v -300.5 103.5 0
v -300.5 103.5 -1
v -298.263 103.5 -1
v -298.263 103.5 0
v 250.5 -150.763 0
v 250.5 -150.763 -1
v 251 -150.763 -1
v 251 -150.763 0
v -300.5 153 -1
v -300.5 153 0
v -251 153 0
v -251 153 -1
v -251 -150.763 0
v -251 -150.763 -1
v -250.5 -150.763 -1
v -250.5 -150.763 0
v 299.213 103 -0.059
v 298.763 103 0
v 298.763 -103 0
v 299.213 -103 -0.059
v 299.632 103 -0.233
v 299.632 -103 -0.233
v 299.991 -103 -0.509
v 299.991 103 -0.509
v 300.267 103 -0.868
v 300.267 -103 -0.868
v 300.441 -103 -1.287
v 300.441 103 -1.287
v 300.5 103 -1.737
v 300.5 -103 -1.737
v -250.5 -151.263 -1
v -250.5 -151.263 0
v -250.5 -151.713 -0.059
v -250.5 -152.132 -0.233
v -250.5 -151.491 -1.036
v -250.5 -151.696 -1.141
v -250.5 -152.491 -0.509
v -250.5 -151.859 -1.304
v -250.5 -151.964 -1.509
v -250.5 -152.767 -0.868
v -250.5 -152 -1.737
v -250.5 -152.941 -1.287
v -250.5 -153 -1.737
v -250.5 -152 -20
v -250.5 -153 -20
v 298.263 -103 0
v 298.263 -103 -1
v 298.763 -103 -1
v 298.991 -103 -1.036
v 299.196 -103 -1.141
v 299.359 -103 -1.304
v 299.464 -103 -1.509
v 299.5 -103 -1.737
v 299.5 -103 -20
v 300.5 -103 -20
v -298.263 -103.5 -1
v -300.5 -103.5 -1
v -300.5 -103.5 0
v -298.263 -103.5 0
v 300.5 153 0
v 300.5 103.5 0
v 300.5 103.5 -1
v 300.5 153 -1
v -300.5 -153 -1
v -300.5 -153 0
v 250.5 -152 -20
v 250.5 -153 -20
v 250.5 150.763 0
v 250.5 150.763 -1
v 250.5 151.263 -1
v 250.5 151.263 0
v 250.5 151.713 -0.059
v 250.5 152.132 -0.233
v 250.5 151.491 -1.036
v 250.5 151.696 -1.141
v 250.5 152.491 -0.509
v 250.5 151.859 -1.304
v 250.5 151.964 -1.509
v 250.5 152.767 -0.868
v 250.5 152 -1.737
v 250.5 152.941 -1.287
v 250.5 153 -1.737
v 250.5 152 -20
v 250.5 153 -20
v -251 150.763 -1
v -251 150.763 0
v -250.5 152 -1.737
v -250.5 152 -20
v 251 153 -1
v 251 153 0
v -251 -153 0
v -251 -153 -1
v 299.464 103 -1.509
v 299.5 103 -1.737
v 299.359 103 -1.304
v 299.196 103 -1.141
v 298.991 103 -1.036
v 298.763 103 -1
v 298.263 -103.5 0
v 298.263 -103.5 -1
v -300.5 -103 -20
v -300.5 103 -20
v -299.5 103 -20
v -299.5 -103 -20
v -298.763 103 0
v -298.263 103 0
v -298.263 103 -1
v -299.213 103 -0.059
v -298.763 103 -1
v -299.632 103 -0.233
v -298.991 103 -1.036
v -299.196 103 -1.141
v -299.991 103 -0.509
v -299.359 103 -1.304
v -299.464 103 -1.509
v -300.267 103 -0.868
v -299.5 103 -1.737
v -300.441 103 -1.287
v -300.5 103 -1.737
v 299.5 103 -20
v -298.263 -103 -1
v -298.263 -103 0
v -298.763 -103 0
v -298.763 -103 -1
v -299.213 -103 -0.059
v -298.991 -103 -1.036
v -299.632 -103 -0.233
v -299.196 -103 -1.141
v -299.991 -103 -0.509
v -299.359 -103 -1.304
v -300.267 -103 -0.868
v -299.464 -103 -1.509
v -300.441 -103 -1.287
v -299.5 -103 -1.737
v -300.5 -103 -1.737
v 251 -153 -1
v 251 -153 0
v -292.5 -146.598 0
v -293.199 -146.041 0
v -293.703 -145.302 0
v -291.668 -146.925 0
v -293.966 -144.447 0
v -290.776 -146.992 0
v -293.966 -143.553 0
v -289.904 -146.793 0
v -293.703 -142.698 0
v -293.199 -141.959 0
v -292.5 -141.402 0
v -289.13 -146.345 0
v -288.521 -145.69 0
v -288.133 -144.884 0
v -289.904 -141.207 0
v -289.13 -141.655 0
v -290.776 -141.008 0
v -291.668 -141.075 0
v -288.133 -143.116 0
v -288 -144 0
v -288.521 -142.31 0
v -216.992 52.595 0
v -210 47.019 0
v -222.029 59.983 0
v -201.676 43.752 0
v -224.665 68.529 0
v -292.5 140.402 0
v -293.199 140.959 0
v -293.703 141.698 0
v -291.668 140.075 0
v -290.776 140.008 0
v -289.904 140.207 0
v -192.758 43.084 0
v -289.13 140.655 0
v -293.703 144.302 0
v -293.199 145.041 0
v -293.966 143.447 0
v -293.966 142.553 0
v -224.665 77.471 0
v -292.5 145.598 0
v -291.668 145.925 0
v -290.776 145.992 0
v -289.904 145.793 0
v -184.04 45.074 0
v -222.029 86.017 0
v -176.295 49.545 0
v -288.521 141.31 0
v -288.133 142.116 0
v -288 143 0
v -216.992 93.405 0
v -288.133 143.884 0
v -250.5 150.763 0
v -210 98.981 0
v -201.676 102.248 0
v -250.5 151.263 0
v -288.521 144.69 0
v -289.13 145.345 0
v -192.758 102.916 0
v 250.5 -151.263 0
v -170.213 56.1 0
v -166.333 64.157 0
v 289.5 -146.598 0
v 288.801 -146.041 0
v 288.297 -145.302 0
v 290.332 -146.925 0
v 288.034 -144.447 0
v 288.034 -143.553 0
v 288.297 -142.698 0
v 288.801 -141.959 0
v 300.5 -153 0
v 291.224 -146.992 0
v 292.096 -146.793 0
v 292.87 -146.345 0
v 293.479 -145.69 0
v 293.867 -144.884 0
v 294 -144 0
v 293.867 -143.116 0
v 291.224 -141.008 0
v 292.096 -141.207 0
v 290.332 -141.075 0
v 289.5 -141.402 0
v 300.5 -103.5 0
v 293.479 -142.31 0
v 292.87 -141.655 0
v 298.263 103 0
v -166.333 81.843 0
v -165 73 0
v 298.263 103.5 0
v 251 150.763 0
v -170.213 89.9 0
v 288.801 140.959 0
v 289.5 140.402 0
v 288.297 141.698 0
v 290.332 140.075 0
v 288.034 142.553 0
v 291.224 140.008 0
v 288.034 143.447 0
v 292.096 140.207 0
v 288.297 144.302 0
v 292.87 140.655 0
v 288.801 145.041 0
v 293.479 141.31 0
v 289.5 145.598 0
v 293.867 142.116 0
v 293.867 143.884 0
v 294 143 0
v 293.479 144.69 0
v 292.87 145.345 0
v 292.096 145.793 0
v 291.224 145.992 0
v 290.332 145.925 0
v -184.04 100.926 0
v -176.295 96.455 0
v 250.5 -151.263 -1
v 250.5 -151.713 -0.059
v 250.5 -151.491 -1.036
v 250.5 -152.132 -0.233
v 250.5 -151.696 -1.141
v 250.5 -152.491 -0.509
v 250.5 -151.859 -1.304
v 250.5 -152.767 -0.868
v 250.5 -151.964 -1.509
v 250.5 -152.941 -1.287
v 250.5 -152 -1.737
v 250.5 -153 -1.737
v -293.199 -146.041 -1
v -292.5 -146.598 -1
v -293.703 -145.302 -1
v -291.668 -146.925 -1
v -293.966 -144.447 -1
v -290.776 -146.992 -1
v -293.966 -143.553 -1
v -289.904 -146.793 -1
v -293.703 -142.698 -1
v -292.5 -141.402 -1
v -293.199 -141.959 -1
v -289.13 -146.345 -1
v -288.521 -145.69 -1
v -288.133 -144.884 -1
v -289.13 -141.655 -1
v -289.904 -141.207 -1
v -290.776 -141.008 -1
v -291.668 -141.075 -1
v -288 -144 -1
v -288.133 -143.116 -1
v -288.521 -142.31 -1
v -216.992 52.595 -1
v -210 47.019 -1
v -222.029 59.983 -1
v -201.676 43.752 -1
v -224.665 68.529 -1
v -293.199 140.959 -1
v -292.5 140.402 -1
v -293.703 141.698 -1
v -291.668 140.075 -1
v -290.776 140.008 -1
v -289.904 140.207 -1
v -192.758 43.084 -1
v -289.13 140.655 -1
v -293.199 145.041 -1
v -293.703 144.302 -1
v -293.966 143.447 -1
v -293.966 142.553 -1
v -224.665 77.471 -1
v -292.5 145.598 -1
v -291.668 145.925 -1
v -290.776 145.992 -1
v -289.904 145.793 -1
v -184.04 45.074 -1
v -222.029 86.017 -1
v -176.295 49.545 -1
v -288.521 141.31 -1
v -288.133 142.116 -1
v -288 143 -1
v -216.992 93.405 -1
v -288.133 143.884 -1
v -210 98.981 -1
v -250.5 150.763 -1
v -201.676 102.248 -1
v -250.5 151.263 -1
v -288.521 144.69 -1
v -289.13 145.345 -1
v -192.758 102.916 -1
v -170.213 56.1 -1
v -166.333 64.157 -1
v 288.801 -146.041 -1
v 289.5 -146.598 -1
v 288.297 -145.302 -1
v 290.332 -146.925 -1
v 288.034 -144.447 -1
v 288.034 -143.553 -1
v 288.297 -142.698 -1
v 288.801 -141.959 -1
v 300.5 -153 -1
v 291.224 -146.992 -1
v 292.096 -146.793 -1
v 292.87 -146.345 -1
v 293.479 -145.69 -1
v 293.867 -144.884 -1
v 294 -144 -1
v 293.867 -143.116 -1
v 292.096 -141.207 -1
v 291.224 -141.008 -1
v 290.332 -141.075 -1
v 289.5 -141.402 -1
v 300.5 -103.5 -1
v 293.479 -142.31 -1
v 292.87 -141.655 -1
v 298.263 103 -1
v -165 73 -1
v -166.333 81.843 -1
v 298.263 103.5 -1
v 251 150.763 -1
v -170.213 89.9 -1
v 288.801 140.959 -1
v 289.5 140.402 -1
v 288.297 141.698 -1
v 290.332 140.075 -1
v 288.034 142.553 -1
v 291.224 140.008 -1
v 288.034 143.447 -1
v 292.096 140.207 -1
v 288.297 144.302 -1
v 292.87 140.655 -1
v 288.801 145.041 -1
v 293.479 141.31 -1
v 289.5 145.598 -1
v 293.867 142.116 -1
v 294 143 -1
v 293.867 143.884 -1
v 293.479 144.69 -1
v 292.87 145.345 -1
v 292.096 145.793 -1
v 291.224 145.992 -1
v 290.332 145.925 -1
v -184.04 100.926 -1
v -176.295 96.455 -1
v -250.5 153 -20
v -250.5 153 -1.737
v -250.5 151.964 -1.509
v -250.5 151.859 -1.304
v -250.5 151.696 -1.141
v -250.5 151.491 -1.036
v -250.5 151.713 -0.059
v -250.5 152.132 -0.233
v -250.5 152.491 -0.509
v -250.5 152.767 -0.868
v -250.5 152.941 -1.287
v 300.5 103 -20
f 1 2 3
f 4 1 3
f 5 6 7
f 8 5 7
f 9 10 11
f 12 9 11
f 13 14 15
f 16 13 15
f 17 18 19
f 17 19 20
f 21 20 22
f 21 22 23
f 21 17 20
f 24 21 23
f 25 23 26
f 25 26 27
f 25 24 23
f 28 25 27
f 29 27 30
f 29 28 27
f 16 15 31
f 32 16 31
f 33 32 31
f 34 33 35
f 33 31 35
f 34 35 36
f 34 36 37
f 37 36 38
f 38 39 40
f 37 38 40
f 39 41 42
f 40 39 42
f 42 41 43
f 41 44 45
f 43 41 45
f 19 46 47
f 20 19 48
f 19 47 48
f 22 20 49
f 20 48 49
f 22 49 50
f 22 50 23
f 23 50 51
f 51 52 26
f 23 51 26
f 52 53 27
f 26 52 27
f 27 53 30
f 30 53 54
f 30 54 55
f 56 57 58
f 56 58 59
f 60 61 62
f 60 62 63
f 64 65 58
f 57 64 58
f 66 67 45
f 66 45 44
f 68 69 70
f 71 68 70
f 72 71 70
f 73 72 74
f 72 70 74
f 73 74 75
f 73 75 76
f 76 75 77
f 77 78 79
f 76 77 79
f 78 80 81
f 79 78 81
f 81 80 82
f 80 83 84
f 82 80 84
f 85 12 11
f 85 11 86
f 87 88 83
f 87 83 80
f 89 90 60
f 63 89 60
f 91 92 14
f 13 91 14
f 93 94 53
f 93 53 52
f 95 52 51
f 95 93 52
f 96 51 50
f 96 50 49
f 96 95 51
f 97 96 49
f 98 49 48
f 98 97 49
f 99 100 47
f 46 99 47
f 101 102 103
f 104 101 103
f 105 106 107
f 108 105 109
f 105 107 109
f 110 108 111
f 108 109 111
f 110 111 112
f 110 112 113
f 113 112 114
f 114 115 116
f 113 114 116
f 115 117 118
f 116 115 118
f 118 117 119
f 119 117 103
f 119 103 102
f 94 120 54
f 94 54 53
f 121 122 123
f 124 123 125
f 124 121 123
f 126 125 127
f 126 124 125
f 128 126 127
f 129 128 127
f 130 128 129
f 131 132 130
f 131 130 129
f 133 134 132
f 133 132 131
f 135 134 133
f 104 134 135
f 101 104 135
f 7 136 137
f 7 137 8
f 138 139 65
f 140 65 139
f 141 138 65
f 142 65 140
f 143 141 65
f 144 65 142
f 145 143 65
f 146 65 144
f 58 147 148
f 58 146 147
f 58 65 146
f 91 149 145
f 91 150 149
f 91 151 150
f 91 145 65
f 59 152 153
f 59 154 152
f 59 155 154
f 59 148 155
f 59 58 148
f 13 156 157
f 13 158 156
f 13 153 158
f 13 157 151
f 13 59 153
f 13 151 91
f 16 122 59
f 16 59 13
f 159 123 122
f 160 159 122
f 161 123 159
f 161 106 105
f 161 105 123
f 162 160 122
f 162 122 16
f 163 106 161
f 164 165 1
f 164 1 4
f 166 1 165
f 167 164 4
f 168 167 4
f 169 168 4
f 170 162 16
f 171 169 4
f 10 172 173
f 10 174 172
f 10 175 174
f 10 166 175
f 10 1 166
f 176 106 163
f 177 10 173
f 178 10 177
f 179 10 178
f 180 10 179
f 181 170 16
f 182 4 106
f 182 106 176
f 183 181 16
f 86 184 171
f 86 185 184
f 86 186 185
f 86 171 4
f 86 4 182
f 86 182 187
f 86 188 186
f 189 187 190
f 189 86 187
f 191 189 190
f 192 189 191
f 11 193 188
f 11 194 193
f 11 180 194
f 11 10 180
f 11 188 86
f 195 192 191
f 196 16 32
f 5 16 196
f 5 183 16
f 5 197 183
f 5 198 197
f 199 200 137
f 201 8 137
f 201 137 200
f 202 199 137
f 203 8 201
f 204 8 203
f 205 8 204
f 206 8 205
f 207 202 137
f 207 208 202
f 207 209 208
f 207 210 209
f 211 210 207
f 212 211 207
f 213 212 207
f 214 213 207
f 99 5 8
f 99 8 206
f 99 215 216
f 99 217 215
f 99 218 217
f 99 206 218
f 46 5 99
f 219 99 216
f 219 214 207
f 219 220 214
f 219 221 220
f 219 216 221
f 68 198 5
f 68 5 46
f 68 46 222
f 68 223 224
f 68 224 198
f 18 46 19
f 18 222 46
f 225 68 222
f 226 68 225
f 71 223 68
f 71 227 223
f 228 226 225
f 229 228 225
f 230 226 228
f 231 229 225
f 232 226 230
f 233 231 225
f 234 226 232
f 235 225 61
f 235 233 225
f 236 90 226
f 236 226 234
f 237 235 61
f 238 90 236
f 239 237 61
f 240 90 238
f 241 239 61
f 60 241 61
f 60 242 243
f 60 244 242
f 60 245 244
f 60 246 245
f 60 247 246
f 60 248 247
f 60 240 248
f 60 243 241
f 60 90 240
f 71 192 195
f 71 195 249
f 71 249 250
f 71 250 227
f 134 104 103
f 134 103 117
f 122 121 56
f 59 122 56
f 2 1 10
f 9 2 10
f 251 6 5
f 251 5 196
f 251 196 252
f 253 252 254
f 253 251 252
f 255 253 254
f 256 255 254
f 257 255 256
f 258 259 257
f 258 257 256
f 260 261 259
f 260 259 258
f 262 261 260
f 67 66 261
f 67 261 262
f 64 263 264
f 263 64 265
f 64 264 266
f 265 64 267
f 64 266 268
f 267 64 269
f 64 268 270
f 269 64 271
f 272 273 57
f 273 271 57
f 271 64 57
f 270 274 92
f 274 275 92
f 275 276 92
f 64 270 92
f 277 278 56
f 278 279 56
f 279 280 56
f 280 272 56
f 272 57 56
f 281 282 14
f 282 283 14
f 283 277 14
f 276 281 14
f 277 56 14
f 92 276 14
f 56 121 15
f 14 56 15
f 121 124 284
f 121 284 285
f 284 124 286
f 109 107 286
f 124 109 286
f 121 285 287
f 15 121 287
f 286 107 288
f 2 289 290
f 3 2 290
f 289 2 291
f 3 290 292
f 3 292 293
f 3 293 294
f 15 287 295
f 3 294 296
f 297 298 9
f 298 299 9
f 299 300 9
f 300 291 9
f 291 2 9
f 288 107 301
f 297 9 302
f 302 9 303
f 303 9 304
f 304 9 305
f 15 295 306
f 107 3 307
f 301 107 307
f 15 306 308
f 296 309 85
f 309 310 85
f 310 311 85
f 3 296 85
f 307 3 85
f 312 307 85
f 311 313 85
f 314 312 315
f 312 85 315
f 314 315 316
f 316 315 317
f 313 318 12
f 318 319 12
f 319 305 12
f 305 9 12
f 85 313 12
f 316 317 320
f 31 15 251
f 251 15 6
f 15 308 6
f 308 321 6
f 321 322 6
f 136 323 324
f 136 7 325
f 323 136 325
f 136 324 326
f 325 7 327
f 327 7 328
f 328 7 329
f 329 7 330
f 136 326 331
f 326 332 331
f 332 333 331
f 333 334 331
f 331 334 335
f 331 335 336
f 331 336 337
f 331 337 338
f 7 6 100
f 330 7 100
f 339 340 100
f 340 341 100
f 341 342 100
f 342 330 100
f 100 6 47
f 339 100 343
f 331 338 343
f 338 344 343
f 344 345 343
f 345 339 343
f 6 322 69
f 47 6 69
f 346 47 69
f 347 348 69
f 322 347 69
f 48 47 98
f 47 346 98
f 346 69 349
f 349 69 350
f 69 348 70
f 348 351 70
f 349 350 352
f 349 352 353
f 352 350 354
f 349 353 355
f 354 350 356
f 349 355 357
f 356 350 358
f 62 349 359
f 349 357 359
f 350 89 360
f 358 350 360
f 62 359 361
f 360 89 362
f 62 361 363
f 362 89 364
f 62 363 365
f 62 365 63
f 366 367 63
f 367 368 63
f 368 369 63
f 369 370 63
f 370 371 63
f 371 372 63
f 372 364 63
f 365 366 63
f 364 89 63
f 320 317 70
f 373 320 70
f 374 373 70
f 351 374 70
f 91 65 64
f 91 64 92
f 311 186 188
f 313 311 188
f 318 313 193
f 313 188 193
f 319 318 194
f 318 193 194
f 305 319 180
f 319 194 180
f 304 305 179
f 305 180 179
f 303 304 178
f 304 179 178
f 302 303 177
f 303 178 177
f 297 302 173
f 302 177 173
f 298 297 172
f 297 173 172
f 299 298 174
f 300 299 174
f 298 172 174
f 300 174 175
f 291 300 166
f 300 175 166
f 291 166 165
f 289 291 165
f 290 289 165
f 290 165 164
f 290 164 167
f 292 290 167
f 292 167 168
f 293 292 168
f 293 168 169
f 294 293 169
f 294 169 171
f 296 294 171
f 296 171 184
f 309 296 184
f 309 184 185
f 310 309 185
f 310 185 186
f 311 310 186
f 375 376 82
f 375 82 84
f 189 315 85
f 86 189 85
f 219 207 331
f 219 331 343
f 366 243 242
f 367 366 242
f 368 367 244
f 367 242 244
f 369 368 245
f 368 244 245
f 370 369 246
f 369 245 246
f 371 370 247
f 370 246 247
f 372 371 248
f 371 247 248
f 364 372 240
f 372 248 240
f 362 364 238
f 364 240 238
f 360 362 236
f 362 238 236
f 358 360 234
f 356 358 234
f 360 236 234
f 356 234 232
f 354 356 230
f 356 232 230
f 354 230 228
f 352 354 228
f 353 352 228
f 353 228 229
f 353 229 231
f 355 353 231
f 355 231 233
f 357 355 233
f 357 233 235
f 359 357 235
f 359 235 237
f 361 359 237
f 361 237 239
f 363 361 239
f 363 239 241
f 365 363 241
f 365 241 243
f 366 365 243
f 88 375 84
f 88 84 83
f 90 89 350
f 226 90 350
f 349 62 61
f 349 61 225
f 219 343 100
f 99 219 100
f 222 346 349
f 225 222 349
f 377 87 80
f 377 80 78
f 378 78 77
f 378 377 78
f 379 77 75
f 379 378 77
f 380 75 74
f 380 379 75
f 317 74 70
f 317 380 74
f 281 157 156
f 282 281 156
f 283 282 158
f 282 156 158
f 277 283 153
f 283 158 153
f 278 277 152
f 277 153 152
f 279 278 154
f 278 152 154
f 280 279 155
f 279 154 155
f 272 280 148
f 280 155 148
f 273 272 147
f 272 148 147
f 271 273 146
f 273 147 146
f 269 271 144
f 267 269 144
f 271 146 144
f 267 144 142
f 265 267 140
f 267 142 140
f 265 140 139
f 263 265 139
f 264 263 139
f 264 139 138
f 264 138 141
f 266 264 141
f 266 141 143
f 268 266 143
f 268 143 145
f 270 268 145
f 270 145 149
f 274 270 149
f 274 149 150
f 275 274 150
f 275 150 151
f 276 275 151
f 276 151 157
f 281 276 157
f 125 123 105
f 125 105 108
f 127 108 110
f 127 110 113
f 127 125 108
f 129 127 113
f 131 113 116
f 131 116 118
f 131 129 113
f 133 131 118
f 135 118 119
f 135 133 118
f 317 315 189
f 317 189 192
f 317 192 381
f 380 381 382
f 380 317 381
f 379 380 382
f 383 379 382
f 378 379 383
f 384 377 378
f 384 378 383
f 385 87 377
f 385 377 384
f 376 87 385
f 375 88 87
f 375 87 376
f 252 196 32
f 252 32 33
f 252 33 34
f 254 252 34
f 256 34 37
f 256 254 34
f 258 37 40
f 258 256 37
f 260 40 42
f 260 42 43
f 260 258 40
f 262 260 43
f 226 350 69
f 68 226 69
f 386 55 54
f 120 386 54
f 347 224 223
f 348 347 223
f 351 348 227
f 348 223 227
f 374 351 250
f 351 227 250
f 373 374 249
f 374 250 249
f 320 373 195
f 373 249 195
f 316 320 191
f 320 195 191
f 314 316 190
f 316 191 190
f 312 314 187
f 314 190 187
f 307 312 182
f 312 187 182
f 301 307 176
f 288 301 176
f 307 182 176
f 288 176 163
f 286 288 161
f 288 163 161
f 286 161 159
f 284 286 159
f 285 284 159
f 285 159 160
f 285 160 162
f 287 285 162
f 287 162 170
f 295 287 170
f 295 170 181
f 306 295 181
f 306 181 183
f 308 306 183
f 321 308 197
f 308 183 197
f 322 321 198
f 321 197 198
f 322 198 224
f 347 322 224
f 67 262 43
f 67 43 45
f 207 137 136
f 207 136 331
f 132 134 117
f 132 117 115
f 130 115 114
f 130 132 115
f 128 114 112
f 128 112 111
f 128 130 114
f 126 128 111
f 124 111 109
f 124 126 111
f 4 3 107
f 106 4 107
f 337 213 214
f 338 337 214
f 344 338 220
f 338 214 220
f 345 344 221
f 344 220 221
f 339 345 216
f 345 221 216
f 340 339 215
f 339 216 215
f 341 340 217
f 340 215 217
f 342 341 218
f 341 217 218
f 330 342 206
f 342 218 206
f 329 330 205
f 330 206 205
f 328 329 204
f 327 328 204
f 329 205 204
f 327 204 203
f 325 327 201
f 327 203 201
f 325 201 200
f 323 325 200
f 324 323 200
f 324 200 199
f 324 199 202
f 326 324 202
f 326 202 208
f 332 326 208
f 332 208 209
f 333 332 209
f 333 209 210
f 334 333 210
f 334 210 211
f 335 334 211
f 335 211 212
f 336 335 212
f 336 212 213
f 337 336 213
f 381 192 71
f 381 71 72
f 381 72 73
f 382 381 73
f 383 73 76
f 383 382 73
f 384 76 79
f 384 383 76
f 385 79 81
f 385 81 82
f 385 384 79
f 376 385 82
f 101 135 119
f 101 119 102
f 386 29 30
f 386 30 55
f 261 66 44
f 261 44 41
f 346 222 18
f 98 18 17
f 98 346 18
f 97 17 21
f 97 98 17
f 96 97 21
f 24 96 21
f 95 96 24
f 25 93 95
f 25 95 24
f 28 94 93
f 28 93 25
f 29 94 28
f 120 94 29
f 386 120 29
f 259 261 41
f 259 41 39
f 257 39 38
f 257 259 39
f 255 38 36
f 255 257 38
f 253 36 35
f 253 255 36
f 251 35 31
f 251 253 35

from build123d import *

# Parameters (mm, degrees)
SKETCH_1_W                        = 601
SKETCH_1_H                        = 306
SKETCH_1_R                        = 30
SM_BASE_FLANGE_1_DEPTH            = 1
SM_EDGE_FLANGE_1_STRIP_W          = 5.4732
SM_EDGE_FLANGE_1_STRIP_H          = 1
SM_EDGE_FLANGE_1_STRIP_CUT_DEPTH  = 501
SM_EDGE_FLANGE_1_RELIEF_W         = 5.9732
SM_EDGE_FLANGE_1_RELIEF_H         = 0.5
SM_EDGE_FLANGE_1_RELIEF_CUT_DEPTH = 1
SM_EDGE_FLANGE_1_DEPTH            = 501
SM_EDGE_FLANGE_2_STRIP_W          = 5.4732
SM_EDGE_FLANGE_2_STRIP_H          = 1
SM_EDGE_FLANGE_2_STRIP_CUT_DEPTH  = 206
SM_EDGE_FLANGE_2_RELIEF_W         = 5.9732
SM_EDGE_FLANGE_2_RELIEF_H         = 0.5
SM_EDGE_FLANGE_2_RELIEF_CUT_DEPTH = 1
SM_EDGE_FLANGE_2_DEPTH            = 206
SM_EDGE_FLANGE_3_STRIP_W          = 5.4732
SM_EDGE_FLANGE_3_STRIP_H          = 1
SM_EDGE_FLANGE_3_STRIP_CUT_DEPTH  = 501
SM_EDGE_FLANGE_3_RELIEF_W         = 5.9732
SM_EDGE_FLANGE_3_RELIEF_H         = 0.5
SM_EDGE_FLANGE_3_RELIEF_CUT_DEPTH = 1
SM_EDGE_FLANGE_3_DEPTH            = 501
SM_EDGE_FLANGE_4_STRIP_W          = 5.4732
SM_EDGE_FLANGE_4_STRIP_H          = 1
SM_EDGE_FLANGE_4_STRIP_CUT_DEPTH  = 206
SM_EDGE_FLANGE_4_RELIEF_W         = 5.9732
SM_EDGE_FLANGE_4_RELIEF_H         = 0.5
SM_EDGE_FLANGE_4_RELIEF_CUT_DEPTH = 1
SM_EDGE_FLANGE_4_DEPTH            = 206
SKETCH_15_R                       = 3
CUT_EXTRUDE_1_DEPTH               = 338.800606867


# Sheet-metal steps are written as plain solids
with BuildPart() as part:
    # Sketch 1 → 基体-法兰1 (new body)
    with BuildSketch(Plane.XY):
        Rectangle(SKETCH_1_W, SKETCH_1_H)
        with Locations((-195, 73)):
            Circle(SKETCH_1_R, mode=Mode.SUBTRACT)
    extrude(amount=-SM_BASE_FLANGE_1_DEPTH)

    # 边线-法兰1 strip (across the edge) → 边线-法兰1 strip cut (cut)
    with BuildSketch(Plane(origin=(-250.5, 153, -1), x_dir=(0, -1, 0), z_dir=(1, 0, 0))):
        with Locations((-1, -0.5)):
            Rectangle(SM_EDGE_FLANGE_1_STRIP_W, SM_EDGE_FLANGE_1_STRIP_H)
    extrude(amount=SM_EDGE_FLANGE_1_STRIP_CUT_DEPTH, mode=Mode.SUBTRACT)

    # 边线-法兰1 relief (on the sheet) → 边线-法兰1 relief cut (cut)
    with BuildSketch(Plane(origin=(-250.5, 151.2634, -1), x_dir=(0, -1, 0), z_dir=(0, 0, -1))):
        with Locations((-2.4866, 0.25)):
            Rectangle(SM_EDGE_FLANGE_1_RELIEF_W, SM_EDGE_FLANGE_1_RELIEF_H)
        with Locations((-2.4866, -501.25)):
            Rectangle(SM_EDGE_FLANGE_1_RELIEF_W, SM_EDGE_FLANGE_1_RELIEF_H)
    extrude(amount=-SM_EDGE_FLANGE_1_RELIEF_CUT_DEPTH, mode=Mode.SUBTRACT)

    # 边线-法兰1 section (across the edge) → 边线-法兰1 (add)
    with BuildSketch(Plane(origin=(-250.5, 153, -1), x_dir=(0, -1, 0), z_dir=(1, 0, 0))):
        with BuildLine():
            Line((0, 0.7366), (0, 19))
            Line((0, 19), (1, 19))
            Line((1, 19), (1, 0.7366))
            ThreePointArc((1, 0.7366), (1.215745145, 0.215745145), (1.7366, 0))
            Line((1.7366, 0), (1.7366, -1))
            ThreePointArc((1.7366, -1), (0.508638364, -0.491361636), (0, 0.7366))
        make_face()
    extrude(amount=SM_EDGE_FLANGE_1_DEPTH)

    # 边线-法兰2 strip (across the edge) → 边线-法兰2 strip cut (cut)
    with BuildSketch(Plane(origin=(300.5, 103, -1), x_dir=(-1, 0, 0), z_dir=(0, -1, 0))):
        with Locations((-1, -0.5)):
            Rectangle(SM_EDGE_FLANGE_2_STRIP_W, SM_EDGE_FLANGE_2_STRIP_H)
    extrude(amount=SM_EDGE_FLANGE_2_STRIP_CUT_DEPTH, mode=Mode.SUBTRACT)

    # 边线-法兰2 relief (on the sheet) → 边线-法兰2 relief cut (cut)
    with BuildSketch(Plane(origin=(298.7634, 103, -1), x_dir=(-1, 0, 0), z_dir=(0, 0, -1))):
        with Locations((-2.4866, 0.25)):
            Rectangle(SM_EDGE_FLANGE_2_RELIEF_W, SM_EDGE_FLANGE_2_RELIEF_H)
        with Locations((-2.4866, -206.25)):
            Rectangle(SM_EDGE_FLANGE_2_RELIEF_W, SM_EDGE_FLANGE_2_RELIEF_H)
    extrude(amount=-SM_EDGE_FLANGE_2_RELIEF_CUT_DEPTH, mode=Mode.SUBTRACT)

    # 边线-法兰2 section (across the edge) → 边线-法兰2 (add)
    with BuildSketch(Plane(origin=(300.5, 103, -1), x_dir=(-1, 0, 0), z_dir=(0, -1, 0))):
        with BuildLine():
            Line((0, 0.7366), (0, 19))
            Line((0, 19), (1, 19))
            Line((1, 19), (1, 0.7366))
            ThreePointArc((1, 0.7366), (1.215745145, 0.215745145), (1.7366, 0))
            Line((1.7366, 0), (1.7366, -1))
            ThreePointArc((1.7366, -1), (0.508638364, -0.491361636), (0, 0.7366))
        make_face()
    extrude(amount=SM_EDGE_FLANGE_2_DEPTH)

    # 边线-法兰3 strip (across the edge) → 边线-法兰3 strip cut (cut)
    with BuildSketch(Plane(origin=(250.5, -153, -1), x_dir=(0, 1, 0), z_dir=(-1, 0, 0))):
        with Locations((-1, -0.5)):
            Rectangle(SM_EDGE_FLANGE_3_STRIP_W, SM_EDGE_FLANGE_3_STRIP_H)
    extrude(amount=SM_EDGE_FLANGE_3_STRIP_CUT_DEPTH, mode=Mode.SUBTRACT)

    # 边线-法兰3 relief (on the sheet) → 边线-法兰3 relief cut (cut)
    with BuildSketch(Plane(origin=(250.5, -151.2634, -1), x_dir=(0, 1, 0), z_dir=(0, 0, -1))):
        with Locations((-2.4866, 0.25)):
            Rectangle(SM_EDGE_FLANGE_3_RELIEF_W, SM_EDGE_FLANGE_3_RELIEF_H)
        with Locations((-2.4866, -501.25)):
            Rectangle(SM_EDGE_FLANGE_3_RELIEF_W, SM_EDGE_FLANGE_3_RELIEF_H)
    extrude(amount=-SM_EDGE_FLANGE_3_RELIEF_CUT_DEPTH, mode=Mode.SUBTRACT)

    # 边线-法兰3 section (across the edge) → 边线-法兰3 (add)
    with BuildSketch(Plane(origin=(250.5, -153, -1), x_dir=(0, 1, 0), z_dir=(-1, 0, 0))):
        with BuildLine():
            Line((0, 0.7366), (0, 19))
            Line((0, 19), (1, 19))
            Line((1, 19), (1, 0.7366))
            ThreePointArc((1, 0.7366), (1.215745145, 0.215745145), (1.7366, 0))
            Line((1.7366, 0), (1.7366, -1))
            ThreePointArc((1.7366, -1), (0.508638364, -0.491361636), (0, 0.7366))
        make_face()
    extrude(amount=SM_EDGE_FLANGE_3_DEPTH)

    # 边线-法兰4 strip (across the edge) → 边线-法兰4 strip cut (cut)
    with BuildSketch(Plane(origin=(-300.5, -103, -1), x_dir=(1, 0, 0), z_dir=(0, 1, 0))):
        with Locations((-1, -0.5)):
            Rectangle(SM_EDGE_FLANGE_4_STRIP_W, SM_EDGE_FLANGE_4_STRIP_H)
    extrude(amount=SM_EDGE_FLANGE_4_STRIP_CUT_DEPTH, mode=Mode.SUBTRACT)

    # 边线-法兰4 relief (on the sheet) → 边线-法兰4 relief cut (cut)
    with BuildSketch(Plane(origin=(-298.7634, -103, -1), x_dir=(1, 0, 0), z_dir=(0, 0, -1))):
        with Locations((-2.4866, 0.25)):
            Rectangle(SM_EDGE_FLANGE_4_RELIEF_W, SM_EDGE_FLANGE_4_RELIEF_H)
        with Locations((-2.4866, -206.25)):
            Rectangle(SM_EDGE_FLANGE_4_RELIEF_W, SM_EDGE_FLANGE_4_RELIEF_H)
    extrude(amount=-SM_EDGE_FLANGE_4_RELIEF_CUT_DEPTH, mode=Mode.SUBTRACT)

    # 边线-法兰4 section (across the edge) → 边线-法兰4 (add)
    with BuildSketch(Plane(origin=(-300.5, -103, -1), x_dir=(1, 0, 0), z_dir=(0, 1, 0))):
        with BuildLine():
            Line((0, 0.7366), (0, 19))
            Line((0, 19), (1, 19))
            Line((1, 19), (1, 0.7366))
            ThreePointArc((1, 0.7366), (1.215745145, 0.215745145), (1.7366, 0))
            Line((1.7366, 0), (1.7366, -1))
            ThreePointArc((1.7366, -1), (0.508638364, -0.491361636), (0, 0.7366))
        make_face()
    extrude(amount=SM_EDGE_FLANGE_4_DEPTH)

    # 草图15 → 切除-拉伸1 (cut, through all)
    with BuildSketch(Plane.XY):
        with Locations((-291, -144)):
            Circle(SKETCH_15_R)
        with Locations((-291, 143)):
            Circle(SKETCH_15_R)
        with Locations((291, 143)):
            Circle(SKETCH_15_R)
        with Locations((291, -144)):
            Circle(SKETCH_15_R)
    extrude(amount=-CUT_EXTRUDE_1_DEPTH, mode=Mode.SUBTRACT)


solid = part.part
